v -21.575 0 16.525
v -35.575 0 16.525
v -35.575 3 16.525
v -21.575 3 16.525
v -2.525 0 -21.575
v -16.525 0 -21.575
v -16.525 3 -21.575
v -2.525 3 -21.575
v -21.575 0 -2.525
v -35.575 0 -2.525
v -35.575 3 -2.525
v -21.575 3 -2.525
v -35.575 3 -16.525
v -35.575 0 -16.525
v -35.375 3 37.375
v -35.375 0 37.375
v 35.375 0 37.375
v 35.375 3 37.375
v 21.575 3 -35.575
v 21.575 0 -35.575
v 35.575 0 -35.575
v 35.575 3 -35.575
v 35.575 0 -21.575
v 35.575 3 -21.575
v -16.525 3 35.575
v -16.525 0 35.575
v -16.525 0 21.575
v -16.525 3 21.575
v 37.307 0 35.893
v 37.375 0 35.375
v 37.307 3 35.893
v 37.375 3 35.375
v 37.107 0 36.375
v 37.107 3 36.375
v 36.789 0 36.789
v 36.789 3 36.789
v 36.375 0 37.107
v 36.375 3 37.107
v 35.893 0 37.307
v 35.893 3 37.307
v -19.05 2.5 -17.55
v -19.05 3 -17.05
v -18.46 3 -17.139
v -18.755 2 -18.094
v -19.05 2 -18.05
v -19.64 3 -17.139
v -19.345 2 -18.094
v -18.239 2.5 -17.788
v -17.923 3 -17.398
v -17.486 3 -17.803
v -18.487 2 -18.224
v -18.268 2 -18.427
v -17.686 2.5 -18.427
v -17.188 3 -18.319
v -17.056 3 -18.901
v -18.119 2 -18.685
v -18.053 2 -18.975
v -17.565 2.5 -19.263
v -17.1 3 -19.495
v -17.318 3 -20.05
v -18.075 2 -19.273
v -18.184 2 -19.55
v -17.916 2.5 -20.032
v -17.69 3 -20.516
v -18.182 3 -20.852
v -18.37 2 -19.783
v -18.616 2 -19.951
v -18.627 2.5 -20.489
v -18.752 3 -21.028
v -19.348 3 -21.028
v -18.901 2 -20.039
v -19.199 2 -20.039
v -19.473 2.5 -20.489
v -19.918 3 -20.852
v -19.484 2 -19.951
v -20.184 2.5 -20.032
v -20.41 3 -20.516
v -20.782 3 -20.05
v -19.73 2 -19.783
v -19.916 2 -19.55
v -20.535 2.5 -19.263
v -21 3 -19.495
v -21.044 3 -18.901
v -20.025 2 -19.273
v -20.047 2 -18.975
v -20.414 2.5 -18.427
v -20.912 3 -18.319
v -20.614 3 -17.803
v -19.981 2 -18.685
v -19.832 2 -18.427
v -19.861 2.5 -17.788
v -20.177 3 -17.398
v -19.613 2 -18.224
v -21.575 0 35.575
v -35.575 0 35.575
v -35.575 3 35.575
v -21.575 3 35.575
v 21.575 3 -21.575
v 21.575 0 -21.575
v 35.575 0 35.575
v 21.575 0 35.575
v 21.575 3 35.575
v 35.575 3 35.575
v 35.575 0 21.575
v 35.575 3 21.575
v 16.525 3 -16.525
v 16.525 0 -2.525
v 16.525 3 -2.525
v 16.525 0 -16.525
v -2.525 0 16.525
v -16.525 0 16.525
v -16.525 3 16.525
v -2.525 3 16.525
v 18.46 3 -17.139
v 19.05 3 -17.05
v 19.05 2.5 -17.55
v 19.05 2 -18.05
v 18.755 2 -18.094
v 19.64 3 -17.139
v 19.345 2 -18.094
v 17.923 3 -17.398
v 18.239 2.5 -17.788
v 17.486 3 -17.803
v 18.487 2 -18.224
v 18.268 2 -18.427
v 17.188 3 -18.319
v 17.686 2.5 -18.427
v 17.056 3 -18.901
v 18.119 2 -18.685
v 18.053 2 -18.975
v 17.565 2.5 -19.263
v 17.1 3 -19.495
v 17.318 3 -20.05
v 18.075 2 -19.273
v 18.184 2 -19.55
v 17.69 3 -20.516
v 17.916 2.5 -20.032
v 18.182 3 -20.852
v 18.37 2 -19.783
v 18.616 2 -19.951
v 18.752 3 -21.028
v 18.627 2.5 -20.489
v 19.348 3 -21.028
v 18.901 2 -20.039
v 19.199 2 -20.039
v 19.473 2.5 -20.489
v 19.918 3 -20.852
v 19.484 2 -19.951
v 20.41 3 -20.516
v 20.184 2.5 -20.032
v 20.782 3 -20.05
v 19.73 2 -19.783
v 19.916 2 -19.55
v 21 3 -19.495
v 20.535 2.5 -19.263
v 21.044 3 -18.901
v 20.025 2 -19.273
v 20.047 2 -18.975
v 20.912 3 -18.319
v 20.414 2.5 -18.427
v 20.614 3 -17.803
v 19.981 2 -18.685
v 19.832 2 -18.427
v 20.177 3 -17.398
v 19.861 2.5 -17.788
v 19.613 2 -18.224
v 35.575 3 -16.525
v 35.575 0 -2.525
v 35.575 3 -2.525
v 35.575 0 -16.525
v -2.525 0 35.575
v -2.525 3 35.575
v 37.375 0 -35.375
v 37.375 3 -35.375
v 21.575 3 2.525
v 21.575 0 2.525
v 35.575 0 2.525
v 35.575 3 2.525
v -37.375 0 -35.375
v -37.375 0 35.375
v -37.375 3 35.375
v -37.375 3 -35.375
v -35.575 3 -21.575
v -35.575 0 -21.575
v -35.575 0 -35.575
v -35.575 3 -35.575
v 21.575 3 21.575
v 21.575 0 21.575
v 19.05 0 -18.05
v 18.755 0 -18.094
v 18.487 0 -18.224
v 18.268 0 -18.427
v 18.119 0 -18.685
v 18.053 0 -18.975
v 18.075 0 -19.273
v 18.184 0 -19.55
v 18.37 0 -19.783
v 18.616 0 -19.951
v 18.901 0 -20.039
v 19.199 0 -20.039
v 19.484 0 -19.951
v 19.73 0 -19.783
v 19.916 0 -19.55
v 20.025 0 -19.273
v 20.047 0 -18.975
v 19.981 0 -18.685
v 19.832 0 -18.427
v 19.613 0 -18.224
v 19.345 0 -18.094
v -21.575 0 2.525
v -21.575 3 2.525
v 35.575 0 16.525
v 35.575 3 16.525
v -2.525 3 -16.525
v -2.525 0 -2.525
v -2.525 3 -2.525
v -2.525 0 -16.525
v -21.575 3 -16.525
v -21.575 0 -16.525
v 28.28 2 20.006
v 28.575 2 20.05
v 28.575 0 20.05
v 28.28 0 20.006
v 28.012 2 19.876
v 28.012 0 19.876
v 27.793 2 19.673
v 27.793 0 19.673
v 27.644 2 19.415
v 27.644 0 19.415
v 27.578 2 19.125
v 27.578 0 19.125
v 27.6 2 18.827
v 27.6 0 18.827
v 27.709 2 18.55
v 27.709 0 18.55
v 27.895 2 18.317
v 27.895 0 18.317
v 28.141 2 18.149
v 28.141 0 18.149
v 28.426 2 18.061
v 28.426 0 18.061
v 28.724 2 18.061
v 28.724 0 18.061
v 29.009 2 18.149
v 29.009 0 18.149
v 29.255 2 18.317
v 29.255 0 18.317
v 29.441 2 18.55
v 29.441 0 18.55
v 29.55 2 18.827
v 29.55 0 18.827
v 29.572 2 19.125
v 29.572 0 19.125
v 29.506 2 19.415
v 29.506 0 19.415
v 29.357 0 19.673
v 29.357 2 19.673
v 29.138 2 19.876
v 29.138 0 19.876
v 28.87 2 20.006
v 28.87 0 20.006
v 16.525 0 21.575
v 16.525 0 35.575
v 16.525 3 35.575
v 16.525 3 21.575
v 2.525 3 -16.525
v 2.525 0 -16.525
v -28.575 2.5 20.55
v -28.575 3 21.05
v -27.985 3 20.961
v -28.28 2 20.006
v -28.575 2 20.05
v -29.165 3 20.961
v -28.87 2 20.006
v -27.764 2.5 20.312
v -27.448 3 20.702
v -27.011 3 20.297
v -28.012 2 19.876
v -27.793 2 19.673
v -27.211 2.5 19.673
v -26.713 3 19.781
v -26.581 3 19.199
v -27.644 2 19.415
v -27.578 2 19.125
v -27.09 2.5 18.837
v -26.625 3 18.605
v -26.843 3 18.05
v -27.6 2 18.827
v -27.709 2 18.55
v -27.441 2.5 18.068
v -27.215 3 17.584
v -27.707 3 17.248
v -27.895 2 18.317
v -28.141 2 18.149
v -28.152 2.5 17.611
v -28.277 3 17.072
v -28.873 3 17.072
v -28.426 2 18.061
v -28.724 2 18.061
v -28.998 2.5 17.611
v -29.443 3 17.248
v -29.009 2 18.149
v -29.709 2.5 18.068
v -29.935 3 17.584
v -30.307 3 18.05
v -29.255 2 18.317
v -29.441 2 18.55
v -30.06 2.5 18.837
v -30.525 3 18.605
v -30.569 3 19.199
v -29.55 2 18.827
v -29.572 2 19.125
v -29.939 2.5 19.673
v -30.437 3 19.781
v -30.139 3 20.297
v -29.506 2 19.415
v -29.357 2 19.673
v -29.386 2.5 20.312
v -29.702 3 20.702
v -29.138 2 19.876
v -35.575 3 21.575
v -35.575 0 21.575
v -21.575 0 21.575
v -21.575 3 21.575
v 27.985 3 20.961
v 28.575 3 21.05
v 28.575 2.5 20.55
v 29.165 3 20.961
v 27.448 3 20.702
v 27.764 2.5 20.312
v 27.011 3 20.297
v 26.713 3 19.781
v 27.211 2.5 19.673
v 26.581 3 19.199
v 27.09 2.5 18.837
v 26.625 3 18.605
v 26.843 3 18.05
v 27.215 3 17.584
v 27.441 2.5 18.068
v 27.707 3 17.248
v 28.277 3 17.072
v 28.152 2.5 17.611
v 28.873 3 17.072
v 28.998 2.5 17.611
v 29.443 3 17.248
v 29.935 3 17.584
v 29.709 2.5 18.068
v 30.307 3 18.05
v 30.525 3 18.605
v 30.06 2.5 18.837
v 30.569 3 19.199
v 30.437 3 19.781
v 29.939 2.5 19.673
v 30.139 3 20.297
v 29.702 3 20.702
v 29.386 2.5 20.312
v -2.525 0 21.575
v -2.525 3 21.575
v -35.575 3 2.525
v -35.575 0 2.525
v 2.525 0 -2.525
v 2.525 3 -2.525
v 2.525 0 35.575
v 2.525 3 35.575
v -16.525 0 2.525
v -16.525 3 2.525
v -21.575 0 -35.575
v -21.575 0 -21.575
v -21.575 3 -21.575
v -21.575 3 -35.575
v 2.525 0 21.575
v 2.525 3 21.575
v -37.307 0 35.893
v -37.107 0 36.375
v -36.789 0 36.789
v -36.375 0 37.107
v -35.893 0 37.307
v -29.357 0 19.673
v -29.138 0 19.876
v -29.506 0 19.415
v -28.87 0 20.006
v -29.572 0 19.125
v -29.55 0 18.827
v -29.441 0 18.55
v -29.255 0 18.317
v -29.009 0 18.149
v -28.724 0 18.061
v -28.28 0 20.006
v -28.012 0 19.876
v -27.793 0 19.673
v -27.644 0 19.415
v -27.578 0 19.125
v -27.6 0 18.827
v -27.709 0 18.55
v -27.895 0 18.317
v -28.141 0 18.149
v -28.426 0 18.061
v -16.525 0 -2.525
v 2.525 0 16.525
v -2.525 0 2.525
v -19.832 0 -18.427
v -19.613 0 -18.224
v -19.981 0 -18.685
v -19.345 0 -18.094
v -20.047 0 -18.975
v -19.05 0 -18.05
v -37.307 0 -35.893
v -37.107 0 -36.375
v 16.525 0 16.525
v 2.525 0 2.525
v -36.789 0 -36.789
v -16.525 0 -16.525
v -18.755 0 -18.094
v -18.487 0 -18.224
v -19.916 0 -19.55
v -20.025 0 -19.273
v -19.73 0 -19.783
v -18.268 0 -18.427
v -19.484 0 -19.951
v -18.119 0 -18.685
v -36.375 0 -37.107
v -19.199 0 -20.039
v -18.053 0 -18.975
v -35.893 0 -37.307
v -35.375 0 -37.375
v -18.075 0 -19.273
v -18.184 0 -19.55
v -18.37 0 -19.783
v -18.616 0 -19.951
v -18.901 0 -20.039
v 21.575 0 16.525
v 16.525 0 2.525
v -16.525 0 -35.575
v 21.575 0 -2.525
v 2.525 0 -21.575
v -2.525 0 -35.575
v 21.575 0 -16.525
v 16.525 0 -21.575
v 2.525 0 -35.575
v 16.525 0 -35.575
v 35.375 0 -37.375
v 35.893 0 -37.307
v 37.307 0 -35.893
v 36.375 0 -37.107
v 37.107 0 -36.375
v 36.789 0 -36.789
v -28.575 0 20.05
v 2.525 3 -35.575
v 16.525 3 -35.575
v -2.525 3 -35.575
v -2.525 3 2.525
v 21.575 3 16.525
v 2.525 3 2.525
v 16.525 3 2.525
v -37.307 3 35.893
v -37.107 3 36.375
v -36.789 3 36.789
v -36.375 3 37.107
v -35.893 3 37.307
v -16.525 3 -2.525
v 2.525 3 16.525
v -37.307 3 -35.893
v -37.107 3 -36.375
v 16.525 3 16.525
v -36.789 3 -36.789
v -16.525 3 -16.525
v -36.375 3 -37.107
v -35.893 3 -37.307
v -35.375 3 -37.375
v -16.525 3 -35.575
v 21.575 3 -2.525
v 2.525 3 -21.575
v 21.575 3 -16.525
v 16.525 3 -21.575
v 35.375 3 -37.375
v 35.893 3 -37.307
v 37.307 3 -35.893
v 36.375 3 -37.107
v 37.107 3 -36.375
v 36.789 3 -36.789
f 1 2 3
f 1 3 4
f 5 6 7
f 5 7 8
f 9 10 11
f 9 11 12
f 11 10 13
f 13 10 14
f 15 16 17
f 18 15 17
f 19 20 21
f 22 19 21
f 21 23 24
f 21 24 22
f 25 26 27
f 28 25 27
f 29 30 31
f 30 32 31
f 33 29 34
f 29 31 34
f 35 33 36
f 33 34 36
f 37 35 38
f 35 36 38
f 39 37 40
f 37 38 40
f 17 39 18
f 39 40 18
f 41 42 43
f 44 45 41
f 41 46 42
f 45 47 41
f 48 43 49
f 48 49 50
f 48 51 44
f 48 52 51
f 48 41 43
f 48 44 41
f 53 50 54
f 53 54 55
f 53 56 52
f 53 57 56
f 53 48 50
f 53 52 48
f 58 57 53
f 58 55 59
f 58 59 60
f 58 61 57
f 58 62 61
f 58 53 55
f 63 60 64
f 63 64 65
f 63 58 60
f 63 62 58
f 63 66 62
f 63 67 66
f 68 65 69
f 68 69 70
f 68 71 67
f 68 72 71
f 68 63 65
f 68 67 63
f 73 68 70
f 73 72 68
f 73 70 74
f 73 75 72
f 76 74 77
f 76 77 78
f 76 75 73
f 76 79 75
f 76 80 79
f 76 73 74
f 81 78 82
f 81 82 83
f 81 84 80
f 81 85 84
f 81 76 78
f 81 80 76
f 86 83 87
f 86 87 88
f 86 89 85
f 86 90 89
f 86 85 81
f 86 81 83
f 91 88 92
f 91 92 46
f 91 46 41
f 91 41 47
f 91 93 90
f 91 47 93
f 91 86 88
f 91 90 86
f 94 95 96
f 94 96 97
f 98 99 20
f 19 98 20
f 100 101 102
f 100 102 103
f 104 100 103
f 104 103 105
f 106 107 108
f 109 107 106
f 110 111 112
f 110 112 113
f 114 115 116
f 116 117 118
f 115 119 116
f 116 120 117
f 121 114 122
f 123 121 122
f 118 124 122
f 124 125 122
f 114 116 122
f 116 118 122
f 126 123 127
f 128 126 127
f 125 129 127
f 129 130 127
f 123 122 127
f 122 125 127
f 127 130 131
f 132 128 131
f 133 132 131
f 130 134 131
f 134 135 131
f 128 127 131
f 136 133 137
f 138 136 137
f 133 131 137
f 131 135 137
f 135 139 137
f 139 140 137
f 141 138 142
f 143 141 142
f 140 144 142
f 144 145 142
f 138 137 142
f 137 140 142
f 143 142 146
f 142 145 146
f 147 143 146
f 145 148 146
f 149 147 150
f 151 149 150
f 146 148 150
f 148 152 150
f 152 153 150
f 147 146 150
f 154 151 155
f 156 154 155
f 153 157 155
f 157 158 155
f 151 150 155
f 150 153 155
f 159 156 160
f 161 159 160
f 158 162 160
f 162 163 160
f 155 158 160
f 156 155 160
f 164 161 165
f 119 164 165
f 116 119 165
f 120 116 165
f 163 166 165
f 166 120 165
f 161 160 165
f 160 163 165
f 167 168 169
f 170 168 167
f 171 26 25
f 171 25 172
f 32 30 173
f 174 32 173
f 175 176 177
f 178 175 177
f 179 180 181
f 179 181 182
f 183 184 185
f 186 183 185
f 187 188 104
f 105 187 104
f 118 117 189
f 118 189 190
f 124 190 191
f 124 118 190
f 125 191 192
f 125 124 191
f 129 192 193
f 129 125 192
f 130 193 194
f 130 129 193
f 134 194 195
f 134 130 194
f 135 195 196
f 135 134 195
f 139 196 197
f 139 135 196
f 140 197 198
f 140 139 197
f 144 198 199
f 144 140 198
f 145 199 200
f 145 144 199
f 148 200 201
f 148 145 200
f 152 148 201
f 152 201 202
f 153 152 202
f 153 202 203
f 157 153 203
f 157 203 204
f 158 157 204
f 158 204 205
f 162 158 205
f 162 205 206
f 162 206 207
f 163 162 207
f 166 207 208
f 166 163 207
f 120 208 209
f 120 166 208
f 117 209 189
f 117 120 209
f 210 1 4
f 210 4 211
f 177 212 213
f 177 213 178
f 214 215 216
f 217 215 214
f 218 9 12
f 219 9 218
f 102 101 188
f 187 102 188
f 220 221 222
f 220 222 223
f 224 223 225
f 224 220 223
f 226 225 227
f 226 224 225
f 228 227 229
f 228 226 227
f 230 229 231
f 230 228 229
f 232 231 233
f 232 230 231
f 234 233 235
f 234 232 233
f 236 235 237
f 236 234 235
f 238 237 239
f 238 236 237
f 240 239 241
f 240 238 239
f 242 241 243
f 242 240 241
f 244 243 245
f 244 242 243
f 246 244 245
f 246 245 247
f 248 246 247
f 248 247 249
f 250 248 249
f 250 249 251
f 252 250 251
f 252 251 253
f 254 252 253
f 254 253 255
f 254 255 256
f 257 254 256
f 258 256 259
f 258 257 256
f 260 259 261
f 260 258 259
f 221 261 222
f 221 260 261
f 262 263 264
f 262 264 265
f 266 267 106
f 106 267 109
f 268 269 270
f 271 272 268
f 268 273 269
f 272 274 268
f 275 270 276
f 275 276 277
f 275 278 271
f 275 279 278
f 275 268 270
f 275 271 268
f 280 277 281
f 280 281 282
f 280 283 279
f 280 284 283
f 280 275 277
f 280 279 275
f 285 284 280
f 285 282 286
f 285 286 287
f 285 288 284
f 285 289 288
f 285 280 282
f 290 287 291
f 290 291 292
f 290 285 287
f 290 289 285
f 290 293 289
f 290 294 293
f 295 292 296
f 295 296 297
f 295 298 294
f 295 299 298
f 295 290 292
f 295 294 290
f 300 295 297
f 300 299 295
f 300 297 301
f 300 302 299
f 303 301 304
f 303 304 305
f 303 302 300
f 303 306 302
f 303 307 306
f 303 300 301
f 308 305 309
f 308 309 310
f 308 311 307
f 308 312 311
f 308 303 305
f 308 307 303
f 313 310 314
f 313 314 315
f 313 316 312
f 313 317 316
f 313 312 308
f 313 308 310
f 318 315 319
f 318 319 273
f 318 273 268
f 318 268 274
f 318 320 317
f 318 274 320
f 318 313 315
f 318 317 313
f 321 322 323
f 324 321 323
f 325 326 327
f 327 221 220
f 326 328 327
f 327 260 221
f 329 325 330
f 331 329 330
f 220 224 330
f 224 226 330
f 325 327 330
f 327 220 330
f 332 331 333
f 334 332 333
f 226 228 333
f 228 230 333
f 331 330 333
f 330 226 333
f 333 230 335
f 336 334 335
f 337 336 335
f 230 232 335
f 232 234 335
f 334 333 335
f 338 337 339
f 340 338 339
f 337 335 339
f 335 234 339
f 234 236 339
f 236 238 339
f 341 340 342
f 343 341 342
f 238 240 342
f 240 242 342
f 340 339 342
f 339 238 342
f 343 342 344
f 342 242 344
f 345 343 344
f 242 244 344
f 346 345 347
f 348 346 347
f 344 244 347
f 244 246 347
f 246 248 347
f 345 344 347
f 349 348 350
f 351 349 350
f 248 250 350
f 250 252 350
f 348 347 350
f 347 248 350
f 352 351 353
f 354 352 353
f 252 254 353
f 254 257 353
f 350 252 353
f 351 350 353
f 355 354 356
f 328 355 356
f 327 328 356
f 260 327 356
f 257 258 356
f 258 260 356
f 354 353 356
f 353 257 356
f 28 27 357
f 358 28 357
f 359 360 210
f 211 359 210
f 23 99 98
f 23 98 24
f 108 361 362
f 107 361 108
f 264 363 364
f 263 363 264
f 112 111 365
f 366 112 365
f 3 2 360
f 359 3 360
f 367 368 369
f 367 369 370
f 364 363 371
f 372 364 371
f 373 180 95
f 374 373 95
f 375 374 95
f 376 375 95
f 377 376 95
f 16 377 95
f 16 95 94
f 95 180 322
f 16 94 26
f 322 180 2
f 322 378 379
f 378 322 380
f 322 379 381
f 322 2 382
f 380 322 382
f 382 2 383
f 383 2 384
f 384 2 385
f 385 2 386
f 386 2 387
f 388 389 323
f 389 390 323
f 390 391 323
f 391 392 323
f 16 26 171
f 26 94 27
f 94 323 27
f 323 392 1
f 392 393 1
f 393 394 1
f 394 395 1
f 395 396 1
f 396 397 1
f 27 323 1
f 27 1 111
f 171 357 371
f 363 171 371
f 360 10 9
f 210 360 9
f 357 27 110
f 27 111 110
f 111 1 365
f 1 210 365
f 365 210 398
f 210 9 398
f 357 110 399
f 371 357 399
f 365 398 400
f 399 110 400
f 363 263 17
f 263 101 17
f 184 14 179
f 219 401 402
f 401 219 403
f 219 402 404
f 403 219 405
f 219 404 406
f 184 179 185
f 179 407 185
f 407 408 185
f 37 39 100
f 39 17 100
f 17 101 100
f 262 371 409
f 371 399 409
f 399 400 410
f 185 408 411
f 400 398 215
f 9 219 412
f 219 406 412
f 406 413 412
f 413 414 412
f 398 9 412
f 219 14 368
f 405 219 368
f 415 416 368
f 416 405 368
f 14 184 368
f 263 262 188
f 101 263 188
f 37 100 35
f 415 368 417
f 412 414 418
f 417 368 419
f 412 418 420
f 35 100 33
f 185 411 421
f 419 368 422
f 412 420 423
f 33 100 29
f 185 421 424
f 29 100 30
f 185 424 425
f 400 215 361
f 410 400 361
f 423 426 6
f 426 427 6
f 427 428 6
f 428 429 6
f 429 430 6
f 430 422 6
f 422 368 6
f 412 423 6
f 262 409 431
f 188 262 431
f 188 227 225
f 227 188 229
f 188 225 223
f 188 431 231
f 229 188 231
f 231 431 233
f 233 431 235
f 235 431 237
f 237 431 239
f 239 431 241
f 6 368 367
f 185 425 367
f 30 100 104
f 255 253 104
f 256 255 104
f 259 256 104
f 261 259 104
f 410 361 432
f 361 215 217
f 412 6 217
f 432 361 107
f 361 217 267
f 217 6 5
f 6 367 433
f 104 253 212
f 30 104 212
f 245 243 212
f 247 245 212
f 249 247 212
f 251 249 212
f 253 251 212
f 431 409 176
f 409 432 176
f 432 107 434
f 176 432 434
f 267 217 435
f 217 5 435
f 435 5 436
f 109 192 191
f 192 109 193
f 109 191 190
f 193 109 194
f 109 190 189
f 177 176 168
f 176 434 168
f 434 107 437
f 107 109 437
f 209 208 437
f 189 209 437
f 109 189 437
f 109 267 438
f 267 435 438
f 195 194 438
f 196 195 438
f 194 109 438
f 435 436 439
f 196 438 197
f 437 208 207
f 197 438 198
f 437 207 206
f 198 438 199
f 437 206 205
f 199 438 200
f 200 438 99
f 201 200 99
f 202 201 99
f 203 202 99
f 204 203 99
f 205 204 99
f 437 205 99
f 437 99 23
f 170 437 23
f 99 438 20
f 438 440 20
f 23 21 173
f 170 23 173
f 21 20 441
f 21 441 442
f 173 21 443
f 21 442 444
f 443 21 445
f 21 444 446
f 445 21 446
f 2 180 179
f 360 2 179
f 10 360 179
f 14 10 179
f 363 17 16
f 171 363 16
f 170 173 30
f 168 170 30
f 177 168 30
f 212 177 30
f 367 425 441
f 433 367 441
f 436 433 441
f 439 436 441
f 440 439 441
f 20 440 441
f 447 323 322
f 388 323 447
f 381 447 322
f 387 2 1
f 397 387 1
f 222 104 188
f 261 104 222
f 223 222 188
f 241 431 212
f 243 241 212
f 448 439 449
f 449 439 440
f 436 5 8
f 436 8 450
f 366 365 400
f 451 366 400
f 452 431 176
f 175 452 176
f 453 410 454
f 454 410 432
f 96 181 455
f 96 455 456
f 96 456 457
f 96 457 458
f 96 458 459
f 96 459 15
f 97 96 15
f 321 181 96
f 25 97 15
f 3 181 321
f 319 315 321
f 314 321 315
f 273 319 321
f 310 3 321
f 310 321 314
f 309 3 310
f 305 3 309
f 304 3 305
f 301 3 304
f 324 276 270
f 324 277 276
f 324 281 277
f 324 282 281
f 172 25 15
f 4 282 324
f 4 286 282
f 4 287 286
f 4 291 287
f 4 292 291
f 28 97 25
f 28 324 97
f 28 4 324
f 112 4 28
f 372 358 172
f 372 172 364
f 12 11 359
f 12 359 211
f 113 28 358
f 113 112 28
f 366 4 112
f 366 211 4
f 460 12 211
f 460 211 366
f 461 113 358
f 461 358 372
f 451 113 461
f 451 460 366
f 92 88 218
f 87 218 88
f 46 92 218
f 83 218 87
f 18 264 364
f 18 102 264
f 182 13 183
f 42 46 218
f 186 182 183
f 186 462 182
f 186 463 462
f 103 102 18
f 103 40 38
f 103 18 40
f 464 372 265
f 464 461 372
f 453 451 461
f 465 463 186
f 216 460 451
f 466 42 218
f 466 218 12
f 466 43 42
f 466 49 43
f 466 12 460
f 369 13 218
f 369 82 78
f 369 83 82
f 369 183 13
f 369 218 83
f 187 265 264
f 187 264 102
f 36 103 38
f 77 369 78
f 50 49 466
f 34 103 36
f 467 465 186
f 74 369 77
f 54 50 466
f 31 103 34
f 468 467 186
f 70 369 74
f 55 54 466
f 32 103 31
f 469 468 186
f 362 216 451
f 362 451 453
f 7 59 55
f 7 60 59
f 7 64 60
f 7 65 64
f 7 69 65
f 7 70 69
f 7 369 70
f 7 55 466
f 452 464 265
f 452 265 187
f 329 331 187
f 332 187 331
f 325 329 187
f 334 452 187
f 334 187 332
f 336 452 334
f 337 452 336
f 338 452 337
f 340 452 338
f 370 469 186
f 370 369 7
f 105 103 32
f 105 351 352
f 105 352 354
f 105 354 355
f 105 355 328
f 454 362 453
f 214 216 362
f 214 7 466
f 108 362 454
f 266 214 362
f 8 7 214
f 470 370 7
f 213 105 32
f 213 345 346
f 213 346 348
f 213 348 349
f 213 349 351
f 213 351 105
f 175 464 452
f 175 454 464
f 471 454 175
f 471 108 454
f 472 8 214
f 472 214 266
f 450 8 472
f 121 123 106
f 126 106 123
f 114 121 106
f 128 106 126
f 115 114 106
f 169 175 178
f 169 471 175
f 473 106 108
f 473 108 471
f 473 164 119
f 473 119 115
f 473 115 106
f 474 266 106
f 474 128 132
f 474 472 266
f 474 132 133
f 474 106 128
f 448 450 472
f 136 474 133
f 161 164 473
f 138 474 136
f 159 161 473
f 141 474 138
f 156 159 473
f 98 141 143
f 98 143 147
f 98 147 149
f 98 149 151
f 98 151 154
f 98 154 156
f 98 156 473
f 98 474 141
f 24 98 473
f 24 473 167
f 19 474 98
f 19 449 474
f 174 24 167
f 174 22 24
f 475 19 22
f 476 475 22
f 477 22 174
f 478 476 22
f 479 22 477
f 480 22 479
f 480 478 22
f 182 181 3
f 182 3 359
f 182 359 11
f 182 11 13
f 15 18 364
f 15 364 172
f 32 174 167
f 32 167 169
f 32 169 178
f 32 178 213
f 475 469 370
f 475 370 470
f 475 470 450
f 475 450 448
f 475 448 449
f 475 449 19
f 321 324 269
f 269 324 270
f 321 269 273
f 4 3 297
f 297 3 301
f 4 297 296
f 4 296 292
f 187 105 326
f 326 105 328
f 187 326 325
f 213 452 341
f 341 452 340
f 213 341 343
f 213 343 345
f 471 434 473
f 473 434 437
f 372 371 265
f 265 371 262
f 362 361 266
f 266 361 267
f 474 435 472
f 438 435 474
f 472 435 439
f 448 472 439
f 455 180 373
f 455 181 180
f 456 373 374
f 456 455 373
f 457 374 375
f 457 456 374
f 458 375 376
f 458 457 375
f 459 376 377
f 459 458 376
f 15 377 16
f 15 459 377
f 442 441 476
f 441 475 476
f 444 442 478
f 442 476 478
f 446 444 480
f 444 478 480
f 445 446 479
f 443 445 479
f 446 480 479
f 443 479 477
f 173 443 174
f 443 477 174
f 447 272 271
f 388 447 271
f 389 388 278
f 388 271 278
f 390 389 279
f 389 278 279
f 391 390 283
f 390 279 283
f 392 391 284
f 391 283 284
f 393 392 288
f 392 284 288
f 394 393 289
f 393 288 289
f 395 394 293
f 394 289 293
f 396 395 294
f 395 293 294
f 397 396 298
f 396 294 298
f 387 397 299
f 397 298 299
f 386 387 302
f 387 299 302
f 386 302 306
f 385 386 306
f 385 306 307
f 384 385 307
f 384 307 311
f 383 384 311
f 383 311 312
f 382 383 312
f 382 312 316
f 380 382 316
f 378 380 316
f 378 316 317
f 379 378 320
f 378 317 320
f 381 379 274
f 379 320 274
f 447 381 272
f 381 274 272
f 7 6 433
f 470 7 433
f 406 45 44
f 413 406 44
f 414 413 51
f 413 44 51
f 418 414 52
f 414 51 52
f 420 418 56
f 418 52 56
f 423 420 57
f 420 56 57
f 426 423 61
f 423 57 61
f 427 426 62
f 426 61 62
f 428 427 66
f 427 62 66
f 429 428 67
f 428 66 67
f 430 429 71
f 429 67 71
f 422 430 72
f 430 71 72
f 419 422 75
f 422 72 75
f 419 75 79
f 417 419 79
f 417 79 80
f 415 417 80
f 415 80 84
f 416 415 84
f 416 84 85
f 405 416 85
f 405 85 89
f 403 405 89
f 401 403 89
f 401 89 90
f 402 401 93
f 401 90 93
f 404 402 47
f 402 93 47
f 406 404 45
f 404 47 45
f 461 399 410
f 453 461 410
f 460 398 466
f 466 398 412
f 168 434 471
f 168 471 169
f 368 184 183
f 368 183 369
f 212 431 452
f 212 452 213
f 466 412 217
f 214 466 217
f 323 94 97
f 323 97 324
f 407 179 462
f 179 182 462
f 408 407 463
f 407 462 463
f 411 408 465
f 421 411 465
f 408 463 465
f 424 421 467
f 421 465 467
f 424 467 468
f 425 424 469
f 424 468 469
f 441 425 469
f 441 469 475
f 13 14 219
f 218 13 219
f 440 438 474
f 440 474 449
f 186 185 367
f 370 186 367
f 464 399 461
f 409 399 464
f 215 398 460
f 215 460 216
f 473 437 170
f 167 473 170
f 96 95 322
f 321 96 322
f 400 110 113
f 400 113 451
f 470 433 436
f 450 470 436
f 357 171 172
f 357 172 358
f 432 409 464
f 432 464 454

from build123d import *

# Parameters (mm, degrees)
SKETCH1_W                = 75.15
SKETCH1_H                = 75.15
SKETCH1_W_2              = 14
SKETCH1_H_2              = 14
BOSS_EXTRUDE1_DEPTH      = 3
SKETCH2_R                = 1
CUT_EXTRUDE1_DEPTH       = 3
CHAMFER1_SIZE            = 1
CHAMFER1_OF_MIRROR1_SIZE = 1
MOVE_FACE1_BY            = 0.2
MOVE_FACE1_2_BY          = 0.2
MOVE_FACE1_3_BY          = 0.2
MOVE_FACE1_4_BY          = 0.2
FILLET1_R                = 2


with BuildPart() as part:
    # Sketch1 → Boss-Extrude1 (new body)
    with BuildSketch(Plane(origin=(0, 0, 0), x_dir=(1, 0, 0), z_dir=(0, 1, 0))):
        Rectangle(SKETCH1_W, SKETCH1_H)
        with Locations((-9.525, 28.575)):
            Rectangle(SKETCH1_W_2, SKETCH1_H_2, mode=Mode.SUBTRACT)
        with Locations((-28.575, 28.575)):
            Rectangle(SKETCH1_W_2, SKETCH1_H_2, mode=Mode.SUBTRACT)
        with Locations((9.525, 28.575)):
            Rectangle(SKETCH1_W_2, SKETCH1_H_2, mode=Mode.SUBTRACT)
        with Locations((28.575, 28.575)):
            Rectangle(SKETCH1_W_2, SKETCH1_H_2, mode=Mode.SUBTRACT)
        with Locations((-9.525, 9.525)):
            Rectangle(SKETCH1_W_2, SKETCH1_H_2, mode=Mode.SUBTRACT)
        with Locations((9.525, 9.525)):
            Rectangle(SKETCH1_W_2, SKETCH1_H_2, mode=Mode.SUBTRACT)
        with Locations((28.575, 9.525)):
            Rectangle(SKETCH1_W_2, SKETCH1_H_2, mode=Mode.SUBTRACT)
        with Locations((-9.525, -9.525)):
            Rectangle(SKETCH1_W_2, SKETCH1_H_2, mode=Mode.SUBTRACT)
        with Locations((9.525, -9.525)):
            Rectangle(SKETCH1_W_2, SKETCH1_H_2, mode=Mode.SUBTRACT)
        with Locations((28.575, -9.525)):
            Rectangle(SKETCH1_W_2, SKETCH1_H_2, mode=Mode.SUBTRACT)
        with Locations((-9.525, -28.575)):
            Rectangle(SKETCH1_W_2, SKETCH1_H_2, mode=Mode.SUBTRACT)
        with Locations((9.525, -28.575)):
            Rectangle(SKETCH1_W_2, SKETCH1_H_2, mode=Mode.SUBTRACT)
        with Locations((28.575, -28.575)):
            Rectangle(SKETCH1_W_2, SKETCH1_H_2, mode=Mode.SUBTRACT)
        with Locations((-28.575, 9.525)):
            Rectangle(SKETCH1_W_2, SKETCH1_H_2, mode=Mode.SUBTRACT)
        with Locations((-28.575, -9.525)):
            Rectangle(SKETCH1_W_2, SKETCH1_H_2, mode=Mode.SUBTRACT)
        with Locations((-28.575, -28.575)):
            Rectangle(SKETCH1_W_2, SKETCH1_H_2, mode=Mode.SUBTRACT)
    extrude(amount=BOSS_EXTRUDE1_DEPTH)

    # Sketch2 → Cut-Extrude1 (cut)
    with BuildSketch(Plane(origin=(0, 3, 0), x_dir=(1, 0, 0), z_dir=(0, 1, 0))):
        with Locations(Location((-19.05, 19.05, 0), (0, 0, 270))):
            Circle(SKETCH2_R)
        with Locations(Location((-28.575, -19.05, 0), (0, 0, 270))):
            Circle(SKETCH2_R)
    cut_extrude1 = extrude(amount=-CUT_EXTRUDE1_DEPTH, mode=Mode.SUBTRACT)

    # Chamfer1
    chamfer1_edges = [part.edges().sort_by_distance(p)[0] for p in [
        (-19.05, 3, -20.05),
        (-28.575, 3, 18.05),
    ]]
    chamfer(chamfer1_edges, length=CHAMFER1_SIZE)

    # Mirror1: Cut-Extrude1 across plane
    add(cut_extrude1.mirror(Plane(origin=(0, 0, 0), x_dir=(0, 0, 1), z_dir=(1, 0, 0))), mode=Mode.SUBTRACT)

    # Chamfer1 of Mirror1
    chamfer1_of_mirror1_edges = [part.edges().sort_by_distance(p)[0] for p in [
        (19.05, 3, -20.05),
        (28.575, 3, 18.05),
    ]]
    chamfer(chamfer1_of_mirror1_edges, length=CHAMFER1_OF_MIRROR1_SIZE)

    # Move Face1: a face moved inward by 0.2
    extrude(part.faces().sort_by_distance((37.575, 1.5, 0))[0], amount=MOVE_FACE1_BY, dir=(-1, 0, 0), mode=Mode.SUBTRACT)

    # Move Face1 2: a face moved inward by 0.2
    extrude(part.faces().sort_by_distance((0, 1.5, -37.575))[0], amount=MOVE_FACE1_2_BY, dir=(0, 0, 1), mode=Mode.SUBTRACT)

    # Move Face1 3: a face moved inward by 0.2
    extrude(part.faces().sort_by_distance((0, 1.5, 37.575))[0], amount=MOVE_FACE1_3_BY, dir=(0, 0, -1), mode=Mode.SUBTRACT)

    # Move Face1 4: a face moved inward by 0.2
    extrude(part.faces().sort_by_distance((-37.575, 1.5, 0))[0], amount=MOVE_FACE1_4_BY, dir=(1, 0, 0), mode=Mode.SUBTRACT)

    # Fillet1
    fillet1_edges = [part.edges().sort_by_distance(p)[0] for p in [
        (37.375, 1.5, 37.375),
        (-37.375, 1.5, 37.375),
        (-37.375, 1.5, -37.375),
        (37.375, 1.5, -37.375),
    ]]
    fillet(fillet1_edges, radius=FILLET1_R)


solid = part.part
